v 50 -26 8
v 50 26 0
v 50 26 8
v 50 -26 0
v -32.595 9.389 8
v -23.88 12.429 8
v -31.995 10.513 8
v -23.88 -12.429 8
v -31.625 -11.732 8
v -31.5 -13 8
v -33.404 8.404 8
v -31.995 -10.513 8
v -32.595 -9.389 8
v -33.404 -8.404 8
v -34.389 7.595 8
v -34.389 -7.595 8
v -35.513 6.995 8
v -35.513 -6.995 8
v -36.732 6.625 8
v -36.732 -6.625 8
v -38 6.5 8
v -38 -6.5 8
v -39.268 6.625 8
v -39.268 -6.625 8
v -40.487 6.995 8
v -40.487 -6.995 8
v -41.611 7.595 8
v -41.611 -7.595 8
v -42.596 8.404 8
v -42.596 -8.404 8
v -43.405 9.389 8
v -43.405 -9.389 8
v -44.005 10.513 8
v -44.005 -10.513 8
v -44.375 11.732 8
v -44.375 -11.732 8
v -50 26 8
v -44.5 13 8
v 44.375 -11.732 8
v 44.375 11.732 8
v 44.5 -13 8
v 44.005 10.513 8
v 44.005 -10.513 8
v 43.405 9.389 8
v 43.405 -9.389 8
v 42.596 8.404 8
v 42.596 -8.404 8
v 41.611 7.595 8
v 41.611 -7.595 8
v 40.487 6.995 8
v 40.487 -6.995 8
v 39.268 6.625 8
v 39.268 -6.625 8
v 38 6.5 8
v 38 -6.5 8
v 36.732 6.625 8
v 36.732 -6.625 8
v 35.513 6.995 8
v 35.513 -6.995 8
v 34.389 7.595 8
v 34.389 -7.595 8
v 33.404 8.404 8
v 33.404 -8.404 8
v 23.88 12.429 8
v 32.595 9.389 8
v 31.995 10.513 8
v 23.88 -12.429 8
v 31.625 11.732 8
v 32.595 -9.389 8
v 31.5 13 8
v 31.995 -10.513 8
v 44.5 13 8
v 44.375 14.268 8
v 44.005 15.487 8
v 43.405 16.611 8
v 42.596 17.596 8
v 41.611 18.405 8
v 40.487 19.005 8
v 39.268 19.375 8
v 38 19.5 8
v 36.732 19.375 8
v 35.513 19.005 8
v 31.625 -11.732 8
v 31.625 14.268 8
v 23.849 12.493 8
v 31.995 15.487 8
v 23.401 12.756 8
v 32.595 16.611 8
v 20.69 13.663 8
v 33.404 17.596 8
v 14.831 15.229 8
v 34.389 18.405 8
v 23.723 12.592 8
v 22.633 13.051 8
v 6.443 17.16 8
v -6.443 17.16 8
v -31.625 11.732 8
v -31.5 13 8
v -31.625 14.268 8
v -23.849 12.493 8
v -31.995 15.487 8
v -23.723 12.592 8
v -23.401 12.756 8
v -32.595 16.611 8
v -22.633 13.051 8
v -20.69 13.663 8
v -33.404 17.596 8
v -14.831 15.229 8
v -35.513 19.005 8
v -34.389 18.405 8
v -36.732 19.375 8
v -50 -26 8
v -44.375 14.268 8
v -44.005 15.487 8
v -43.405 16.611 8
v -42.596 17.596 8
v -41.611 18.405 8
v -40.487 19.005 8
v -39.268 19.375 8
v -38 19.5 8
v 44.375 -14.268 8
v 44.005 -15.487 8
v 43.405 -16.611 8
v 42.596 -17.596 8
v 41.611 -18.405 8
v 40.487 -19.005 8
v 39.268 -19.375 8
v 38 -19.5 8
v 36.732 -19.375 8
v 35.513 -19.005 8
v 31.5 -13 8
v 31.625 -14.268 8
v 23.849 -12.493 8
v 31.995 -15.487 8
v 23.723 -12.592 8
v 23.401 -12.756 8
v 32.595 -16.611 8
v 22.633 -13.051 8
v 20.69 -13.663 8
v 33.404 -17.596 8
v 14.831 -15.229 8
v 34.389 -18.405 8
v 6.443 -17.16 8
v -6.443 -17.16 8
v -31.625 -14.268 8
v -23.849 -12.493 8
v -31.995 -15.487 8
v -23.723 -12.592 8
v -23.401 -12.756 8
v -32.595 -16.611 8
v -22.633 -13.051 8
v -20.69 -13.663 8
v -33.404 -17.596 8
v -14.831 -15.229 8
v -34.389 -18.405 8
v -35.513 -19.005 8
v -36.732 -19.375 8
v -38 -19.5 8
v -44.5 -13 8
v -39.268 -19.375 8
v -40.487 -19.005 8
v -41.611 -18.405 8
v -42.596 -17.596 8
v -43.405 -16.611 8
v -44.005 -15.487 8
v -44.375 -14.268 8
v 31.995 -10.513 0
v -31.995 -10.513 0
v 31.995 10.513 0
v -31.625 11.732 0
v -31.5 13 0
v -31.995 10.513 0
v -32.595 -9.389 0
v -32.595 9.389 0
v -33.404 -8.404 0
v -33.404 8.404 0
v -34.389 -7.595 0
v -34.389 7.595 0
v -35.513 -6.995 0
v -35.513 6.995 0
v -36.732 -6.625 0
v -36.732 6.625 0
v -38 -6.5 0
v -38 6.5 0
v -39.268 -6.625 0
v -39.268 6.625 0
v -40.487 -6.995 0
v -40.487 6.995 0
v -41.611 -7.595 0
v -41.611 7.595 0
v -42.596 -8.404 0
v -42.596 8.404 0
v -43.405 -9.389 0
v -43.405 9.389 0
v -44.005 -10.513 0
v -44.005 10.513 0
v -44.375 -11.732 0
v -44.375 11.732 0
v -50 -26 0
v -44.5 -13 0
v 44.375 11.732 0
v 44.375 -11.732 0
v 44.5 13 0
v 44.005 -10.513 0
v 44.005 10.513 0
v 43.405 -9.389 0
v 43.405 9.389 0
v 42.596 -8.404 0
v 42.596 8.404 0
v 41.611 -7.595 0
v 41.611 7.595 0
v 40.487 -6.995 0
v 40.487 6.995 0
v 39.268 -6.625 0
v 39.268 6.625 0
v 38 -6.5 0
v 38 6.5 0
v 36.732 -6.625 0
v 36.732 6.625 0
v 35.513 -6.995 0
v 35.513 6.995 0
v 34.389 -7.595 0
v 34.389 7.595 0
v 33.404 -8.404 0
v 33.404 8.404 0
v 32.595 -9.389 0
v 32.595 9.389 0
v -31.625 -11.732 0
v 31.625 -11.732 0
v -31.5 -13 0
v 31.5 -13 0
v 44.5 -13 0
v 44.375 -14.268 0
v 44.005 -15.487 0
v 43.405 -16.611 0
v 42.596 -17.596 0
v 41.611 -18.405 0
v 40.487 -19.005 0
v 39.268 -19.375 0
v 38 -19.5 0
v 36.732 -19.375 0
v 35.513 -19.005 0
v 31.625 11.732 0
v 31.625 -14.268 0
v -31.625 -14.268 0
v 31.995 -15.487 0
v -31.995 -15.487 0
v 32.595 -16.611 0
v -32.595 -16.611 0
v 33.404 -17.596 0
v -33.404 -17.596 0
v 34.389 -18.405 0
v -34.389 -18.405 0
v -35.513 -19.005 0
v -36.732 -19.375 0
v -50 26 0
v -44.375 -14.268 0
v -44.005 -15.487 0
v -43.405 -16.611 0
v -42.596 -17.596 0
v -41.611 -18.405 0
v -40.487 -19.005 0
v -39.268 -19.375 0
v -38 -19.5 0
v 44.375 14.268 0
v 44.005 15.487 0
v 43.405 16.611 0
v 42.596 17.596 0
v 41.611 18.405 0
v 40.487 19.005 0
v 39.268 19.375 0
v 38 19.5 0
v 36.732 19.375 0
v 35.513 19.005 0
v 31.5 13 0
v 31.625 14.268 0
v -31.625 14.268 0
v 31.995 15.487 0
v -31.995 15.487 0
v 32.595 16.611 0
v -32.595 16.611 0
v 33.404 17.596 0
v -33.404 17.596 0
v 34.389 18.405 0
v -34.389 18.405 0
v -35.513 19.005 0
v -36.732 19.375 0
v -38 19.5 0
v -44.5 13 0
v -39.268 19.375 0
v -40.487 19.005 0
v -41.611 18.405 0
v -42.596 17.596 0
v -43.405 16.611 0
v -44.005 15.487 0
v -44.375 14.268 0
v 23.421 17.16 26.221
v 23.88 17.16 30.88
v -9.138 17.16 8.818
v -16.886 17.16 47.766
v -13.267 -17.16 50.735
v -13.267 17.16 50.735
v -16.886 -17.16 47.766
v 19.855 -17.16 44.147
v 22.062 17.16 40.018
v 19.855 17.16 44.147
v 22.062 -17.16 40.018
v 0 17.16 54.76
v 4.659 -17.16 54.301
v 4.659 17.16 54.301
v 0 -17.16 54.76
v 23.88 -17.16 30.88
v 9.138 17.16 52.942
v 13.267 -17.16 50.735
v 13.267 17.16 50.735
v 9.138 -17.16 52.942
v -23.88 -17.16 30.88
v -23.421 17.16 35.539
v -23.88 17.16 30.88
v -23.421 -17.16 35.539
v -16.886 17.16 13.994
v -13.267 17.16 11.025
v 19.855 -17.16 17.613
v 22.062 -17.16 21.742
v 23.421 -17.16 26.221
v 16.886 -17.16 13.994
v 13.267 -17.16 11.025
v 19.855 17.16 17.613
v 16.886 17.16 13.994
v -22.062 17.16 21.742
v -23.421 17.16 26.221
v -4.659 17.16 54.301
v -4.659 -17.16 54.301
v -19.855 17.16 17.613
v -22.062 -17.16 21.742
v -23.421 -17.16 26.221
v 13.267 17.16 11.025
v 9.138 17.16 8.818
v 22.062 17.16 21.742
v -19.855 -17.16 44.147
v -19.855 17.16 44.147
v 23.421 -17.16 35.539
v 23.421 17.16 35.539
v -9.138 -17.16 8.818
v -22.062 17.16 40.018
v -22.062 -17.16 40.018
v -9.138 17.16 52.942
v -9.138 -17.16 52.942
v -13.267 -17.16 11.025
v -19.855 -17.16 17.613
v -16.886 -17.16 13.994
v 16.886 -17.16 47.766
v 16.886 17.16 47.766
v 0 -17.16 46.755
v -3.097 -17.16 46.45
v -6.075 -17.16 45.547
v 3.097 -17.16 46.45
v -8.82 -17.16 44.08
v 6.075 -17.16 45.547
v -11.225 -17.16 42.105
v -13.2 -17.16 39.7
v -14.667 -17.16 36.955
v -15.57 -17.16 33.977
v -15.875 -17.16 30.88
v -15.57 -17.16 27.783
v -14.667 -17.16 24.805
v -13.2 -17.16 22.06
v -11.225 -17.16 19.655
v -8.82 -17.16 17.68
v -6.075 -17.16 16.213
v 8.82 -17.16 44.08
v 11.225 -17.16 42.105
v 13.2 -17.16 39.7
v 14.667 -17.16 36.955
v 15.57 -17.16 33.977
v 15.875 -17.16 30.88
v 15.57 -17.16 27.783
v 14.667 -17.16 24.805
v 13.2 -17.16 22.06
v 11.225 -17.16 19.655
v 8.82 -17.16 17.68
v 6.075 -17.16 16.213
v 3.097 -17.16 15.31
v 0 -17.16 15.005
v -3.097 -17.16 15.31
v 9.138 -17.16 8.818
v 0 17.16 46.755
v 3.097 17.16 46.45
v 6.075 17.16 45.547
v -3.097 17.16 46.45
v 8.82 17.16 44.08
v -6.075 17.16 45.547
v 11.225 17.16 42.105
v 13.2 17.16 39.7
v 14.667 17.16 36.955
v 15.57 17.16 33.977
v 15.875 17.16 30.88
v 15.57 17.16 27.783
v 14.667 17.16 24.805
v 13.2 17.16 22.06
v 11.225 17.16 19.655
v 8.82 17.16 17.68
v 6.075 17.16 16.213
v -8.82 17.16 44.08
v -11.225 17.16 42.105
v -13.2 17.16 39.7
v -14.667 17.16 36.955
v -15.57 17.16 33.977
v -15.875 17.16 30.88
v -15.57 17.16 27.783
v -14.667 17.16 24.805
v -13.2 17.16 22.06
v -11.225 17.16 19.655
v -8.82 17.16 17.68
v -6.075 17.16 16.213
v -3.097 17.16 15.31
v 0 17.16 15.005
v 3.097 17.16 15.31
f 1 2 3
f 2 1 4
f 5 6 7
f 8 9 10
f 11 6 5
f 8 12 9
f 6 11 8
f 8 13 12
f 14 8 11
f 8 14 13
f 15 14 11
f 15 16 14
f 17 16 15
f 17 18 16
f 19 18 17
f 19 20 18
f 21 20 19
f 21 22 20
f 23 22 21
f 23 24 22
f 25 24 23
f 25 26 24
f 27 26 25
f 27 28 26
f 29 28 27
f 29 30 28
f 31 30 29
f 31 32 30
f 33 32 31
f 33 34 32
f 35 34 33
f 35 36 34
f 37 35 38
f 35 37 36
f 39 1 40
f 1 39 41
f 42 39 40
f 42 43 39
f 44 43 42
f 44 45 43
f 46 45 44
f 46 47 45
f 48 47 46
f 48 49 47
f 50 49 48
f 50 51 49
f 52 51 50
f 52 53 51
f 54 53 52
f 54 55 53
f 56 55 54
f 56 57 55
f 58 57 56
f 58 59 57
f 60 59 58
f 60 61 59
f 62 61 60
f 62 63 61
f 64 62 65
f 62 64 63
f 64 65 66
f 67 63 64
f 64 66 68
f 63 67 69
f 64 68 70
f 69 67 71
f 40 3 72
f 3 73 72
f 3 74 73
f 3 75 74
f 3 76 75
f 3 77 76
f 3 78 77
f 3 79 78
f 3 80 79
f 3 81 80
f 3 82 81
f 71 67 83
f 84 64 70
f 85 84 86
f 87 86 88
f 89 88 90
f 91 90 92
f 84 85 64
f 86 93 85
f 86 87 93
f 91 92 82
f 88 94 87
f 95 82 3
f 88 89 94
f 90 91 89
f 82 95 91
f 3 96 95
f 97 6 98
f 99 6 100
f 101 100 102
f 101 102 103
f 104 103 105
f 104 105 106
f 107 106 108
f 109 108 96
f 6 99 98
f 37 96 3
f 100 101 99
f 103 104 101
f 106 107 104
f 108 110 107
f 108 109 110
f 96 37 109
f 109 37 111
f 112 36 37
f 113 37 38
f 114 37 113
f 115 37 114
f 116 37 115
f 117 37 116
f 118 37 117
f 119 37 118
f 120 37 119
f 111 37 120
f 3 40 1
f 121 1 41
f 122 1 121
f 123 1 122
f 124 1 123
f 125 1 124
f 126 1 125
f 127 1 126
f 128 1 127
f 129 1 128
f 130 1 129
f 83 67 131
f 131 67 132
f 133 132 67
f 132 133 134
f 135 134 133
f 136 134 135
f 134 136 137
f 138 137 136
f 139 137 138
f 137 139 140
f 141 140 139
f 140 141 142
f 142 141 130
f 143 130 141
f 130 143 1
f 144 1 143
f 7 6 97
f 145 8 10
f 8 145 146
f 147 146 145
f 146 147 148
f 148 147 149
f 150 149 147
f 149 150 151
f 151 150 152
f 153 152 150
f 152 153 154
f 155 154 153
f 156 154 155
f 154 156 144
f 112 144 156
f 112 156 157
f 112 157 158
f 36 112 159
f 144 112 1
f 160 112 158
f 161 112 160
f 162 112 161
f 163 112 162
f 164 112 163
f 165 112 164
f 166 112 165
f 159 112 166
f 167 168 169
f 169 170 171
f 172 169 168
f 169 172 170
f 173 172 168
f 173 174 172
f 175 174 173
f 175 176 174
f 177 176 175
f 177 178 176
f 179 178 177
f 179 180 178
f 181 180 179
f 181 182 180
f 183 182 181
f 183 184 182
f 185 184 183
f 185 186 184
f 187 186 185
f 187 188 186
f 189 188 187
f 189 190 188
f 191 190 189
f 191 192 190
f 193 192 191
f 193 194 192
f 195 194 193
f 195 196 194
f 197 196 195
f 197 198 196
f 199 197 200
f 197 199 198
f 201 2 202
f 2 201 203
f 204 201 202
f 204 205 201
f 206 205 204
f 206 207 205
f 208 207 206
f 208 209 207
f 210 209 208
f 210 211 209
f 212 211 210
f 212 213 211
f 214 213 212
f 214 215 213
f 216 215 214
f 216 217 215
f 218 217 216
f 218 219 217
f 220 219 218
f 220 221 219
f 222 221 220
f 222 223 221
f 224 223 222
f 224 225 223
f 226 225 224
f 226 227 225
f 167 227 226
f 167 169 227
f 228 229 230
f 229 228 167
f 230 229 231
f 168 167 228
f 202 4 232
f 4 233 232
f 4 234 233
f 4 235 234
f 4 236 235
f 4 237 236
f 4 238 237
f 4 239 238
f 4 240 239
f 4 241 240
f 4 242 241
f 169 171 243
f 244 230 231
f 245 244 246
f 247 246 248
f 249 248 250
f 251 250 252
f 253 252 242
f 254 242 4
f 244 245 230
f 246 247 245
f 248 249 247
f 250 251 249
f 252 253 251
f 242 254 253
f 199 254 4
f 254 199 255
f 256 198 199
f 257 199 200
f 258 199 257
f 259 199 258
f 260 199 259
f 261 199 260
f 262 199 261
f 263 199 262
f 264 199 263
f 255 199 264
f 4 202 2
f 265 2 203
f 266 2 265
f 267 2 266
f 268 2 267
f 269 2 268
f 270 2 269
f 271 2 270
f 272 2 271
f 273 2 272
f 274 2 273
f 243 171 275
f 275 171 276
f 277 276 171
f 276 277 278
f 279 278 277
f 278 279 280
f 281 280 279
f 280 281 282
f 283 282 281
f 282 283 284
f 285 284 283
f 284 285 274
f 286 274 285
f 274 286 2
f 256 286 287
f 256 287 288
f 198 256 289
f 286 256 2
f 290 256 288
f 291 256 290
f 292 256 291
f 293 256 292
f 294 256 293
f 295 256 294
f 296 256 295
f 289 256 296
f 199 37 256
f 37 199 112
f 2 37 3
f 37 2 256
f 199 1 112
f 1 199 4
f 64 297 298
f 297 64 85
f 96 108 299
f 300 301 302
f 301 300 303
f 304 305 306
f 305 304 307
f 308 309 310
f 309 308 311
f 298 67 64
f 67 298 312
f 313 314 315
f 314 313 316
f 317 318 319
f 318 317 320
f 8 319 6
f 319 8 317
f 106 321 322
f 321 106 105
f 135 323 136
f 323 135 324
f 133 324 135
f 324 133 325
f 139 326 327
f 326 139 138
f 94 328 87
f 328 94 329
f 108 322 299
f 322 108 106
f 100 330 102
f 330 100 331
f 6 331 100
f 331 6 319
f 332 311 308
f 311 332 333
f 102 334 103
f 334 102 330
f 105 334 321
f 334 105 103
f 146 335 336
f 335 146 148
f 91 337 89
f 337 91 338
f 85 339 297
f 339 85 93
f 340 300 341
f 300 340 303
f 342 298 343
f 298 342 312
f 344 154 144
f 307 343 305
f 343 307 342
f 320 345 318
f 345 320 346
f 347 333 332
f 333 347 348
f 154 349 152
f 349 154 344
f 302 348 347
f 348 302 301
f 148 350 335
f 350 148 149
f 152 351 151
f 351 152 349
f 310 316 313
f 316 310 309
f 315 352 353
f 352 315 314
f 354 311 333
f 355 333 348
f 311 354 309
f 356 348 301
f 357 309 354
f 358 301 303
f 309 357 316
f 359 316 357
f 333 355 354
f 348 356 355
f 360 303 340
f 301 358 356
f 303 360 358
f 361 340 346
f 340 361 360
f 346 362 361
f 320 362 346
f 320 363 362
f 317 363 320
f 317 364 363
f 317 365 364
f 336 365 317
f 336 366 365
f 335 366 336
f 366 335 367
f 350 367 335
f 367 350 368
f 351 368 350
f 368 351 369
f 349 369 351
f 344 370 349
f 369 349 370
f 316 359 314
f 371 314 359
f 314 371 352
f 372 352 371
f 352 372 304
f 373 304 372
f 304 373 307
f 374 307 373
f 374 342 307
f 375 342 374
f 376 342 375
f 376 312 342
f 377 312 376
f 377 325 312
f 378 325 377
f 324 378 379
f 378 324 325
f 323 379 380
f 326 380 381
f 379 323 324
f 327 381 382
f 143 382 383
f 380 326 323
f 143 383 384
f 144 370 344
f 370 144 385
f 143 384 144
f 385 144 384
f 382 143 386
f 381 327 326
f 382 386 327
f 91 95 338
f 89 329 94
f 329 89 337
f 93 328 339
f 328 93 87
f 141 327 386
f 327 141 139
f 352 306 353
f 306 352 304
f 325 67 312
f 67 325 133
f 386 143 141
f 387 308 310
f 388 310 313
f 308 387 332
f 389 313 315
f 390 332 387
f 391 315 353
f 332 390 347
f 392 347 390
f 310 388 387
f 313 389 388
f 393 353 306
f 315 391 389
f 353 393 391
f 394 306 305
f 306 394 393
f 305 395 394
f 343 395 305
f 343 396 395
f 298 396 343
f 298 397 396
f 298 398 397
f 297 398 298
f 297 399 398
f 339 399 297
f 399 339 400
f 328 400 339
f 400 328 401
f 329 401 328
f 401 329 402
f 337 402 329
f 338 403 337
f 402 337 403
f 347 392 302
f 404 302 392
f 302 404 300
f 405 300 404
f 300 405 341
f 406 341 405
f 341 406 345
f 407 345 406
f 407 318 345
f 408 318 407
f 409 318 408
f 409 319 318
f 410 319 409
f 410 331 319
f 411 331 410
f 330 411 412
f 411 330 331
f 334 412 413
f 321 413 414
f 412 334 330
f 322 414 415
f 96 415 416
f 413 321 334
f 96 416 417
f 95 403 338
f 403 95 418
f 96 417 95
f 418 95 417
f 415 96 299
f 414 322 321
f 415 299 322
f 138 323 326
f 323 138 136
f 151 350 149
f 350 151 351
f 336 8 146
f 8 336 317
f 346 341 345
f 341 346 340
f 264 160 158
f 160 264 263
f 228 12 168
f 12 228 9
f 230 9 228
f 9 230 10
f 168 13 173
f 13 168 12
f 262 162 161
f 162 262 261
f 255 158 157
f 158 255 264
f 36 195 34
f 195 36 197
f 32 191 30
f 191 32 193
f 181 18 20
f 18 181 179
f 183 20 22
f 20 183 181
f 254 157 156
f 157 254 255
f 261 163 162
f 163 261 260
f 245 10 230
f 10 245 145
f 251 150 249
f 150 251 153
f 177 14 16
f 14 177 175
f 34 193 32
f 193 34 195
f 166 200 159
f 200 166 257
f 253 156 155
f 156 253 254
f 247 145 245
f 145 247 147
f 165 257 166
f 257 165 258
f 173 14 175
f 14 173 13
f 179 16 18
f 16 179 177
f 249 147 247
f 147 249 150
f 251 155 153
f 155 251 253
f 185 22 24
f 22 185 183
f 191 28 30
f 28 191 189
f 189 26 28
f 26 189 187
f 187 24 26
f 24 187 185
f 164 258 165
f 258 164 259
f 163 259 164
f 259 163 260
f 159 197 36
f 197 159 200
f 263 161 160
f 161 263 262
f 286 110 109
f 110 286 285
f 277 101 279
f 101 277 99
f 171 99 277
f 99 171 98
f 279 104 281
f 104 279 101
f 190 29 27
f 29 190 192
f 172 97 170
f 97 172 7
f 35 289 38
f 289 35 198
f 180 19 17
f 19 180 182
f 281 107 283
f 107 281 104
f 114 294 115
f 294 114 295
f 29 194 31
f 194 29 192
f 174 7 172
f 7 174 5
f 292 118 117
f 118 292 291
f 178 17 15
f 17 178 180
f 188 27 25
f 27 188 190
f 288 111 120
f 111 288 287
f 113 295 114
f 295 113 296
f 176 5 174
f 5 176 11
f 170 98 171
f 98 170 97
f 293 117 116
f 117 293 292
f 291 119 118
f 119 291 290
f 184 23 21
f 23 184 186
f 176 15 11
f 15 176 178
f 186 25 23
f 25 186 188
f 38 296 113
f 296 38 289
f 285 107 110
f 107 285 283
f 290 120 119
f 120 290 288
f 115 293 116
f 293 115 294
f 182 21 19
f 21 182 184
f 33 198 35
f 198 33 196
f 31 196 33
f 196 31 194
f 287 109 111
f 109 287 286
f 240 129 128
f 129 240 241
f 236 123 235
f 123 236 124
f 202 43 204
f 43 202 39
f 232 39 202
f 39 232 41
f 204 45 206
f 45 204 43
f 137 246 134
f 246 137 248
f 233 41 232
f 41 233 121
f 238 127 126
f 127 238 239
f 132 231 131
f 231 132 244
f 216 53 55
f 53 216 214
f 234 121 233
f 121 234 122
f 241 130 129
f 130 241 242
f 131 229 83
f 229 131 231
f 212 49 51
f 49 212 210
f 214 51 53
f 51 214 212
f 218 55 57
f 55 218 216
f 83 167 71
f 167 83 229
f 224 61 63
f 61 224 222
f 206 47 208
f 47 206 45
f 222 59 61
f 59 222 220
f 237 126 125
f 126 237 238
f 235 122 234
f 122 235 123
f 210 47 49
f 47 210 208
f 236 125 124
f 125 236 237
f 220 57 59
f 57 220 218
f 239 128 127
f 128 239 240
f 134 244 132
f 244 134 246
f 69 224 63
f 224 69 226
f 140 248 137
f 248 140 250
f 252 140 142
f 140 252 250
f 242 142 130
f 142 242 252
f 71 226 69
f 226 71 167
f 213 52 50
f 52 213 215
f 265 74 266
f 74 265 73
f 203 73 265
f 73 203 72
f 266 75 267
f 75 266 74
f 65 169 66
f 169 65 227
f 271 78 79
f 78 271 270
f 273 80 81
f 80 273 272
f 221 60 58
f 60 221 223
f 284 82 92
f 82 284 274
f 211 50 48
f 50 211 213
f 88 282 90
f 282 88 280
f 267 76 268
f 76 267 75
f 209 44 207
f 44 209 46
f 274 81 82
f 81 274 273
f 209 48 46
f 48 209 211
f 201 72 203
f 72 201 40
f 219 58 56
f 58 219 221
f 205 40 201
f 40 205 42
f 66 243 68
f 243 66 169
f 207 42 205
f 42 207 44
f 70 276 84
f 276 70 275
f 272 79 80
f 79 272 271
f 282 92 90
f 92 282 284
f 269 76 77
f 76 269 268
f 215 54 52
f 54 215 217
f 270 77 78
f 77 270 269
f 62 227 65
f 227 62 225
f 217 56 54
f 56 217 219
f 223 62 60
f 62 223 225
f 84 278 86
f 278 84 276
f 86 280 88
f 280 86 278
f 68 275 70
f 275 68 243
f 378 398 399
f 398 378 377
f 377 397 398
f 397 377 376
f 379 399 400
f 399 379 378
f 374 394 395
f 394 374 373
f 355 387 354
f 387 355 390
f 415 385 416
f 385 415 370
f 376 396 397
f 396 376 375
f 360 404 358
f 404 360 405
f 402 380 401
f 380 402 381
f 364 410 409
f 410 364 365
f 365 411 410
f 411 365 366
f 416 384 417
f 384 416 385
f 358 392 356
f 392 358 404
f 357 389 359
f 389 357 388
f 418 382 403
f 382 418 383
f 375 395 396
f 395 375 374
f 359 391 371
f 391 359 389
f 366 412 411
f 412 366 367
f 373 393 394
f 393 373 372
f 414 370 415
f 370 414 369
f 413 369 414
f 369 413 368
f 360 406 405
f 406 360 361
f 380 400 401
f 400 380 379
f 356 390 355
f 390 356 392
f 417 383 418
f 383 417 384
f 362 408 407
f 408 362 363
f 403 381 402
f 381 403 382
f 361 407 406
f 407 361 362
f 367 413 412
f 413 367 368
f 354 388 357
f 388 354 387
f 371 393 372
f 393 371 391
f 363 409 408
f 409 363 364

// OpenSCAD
$fn = 32;

// ----------------------------------------------------------------------
// Bearing block: 100 x 52 mm base, 31.75 mm bore at 30.88 mm
// ----------------------------------------------------------------------

// --- parameters (mm) ---
base_w = 100;             // base width
base_d = 52;              // base depth
base_t = 8;               // base thickness
bore_d = 31.75;           // shaft / bearing bore
house_r = 23.88;          // housing outer radius
house_len = 34.32;        // housing length along the shaft
foot_w = 47.76;           // foot width under the housing
foot_len = 24.32;         // foot length along the shaft
axis_z = 30.88;           // bore axis height above the base
holes_d = 13;             // mounting holes
hole_x = 38;              // mounting hole spacing

difference() {
  union() {
    /* base plate with its underside on z = 0 */
    translate([0, 0, base_t / 2]) cube([base_w, base_d, base_t], center = true);
    /* hull foot: a straight web blending into the round housing */
    hull() {
      translate([0, 0, base_t - 0.5]) cube([foot_w, foot_len, 1.6], center = true);
      translate([0, 0, axis_z]) rotate([-90, 0, 0]) cylinder(h = house_len, d = 2 * house_r, center = true);
    }
  }
  /* bore through the housing, 2.5 mm clear on both sides */
  translate([0, 0, axis_z]) rotate([-90, 0, 0]) cylinder(h = house_len + 5, d = bore_d, center = true);
  /* mounting holes through the base plate */
  for (hx = [-38, 38]) {
    for (hy = [-13, 13]) {
      translate([hx, hy, -2.5]) cylinder(h = base_t + 5, d = holes_d);
    }
  }
}
